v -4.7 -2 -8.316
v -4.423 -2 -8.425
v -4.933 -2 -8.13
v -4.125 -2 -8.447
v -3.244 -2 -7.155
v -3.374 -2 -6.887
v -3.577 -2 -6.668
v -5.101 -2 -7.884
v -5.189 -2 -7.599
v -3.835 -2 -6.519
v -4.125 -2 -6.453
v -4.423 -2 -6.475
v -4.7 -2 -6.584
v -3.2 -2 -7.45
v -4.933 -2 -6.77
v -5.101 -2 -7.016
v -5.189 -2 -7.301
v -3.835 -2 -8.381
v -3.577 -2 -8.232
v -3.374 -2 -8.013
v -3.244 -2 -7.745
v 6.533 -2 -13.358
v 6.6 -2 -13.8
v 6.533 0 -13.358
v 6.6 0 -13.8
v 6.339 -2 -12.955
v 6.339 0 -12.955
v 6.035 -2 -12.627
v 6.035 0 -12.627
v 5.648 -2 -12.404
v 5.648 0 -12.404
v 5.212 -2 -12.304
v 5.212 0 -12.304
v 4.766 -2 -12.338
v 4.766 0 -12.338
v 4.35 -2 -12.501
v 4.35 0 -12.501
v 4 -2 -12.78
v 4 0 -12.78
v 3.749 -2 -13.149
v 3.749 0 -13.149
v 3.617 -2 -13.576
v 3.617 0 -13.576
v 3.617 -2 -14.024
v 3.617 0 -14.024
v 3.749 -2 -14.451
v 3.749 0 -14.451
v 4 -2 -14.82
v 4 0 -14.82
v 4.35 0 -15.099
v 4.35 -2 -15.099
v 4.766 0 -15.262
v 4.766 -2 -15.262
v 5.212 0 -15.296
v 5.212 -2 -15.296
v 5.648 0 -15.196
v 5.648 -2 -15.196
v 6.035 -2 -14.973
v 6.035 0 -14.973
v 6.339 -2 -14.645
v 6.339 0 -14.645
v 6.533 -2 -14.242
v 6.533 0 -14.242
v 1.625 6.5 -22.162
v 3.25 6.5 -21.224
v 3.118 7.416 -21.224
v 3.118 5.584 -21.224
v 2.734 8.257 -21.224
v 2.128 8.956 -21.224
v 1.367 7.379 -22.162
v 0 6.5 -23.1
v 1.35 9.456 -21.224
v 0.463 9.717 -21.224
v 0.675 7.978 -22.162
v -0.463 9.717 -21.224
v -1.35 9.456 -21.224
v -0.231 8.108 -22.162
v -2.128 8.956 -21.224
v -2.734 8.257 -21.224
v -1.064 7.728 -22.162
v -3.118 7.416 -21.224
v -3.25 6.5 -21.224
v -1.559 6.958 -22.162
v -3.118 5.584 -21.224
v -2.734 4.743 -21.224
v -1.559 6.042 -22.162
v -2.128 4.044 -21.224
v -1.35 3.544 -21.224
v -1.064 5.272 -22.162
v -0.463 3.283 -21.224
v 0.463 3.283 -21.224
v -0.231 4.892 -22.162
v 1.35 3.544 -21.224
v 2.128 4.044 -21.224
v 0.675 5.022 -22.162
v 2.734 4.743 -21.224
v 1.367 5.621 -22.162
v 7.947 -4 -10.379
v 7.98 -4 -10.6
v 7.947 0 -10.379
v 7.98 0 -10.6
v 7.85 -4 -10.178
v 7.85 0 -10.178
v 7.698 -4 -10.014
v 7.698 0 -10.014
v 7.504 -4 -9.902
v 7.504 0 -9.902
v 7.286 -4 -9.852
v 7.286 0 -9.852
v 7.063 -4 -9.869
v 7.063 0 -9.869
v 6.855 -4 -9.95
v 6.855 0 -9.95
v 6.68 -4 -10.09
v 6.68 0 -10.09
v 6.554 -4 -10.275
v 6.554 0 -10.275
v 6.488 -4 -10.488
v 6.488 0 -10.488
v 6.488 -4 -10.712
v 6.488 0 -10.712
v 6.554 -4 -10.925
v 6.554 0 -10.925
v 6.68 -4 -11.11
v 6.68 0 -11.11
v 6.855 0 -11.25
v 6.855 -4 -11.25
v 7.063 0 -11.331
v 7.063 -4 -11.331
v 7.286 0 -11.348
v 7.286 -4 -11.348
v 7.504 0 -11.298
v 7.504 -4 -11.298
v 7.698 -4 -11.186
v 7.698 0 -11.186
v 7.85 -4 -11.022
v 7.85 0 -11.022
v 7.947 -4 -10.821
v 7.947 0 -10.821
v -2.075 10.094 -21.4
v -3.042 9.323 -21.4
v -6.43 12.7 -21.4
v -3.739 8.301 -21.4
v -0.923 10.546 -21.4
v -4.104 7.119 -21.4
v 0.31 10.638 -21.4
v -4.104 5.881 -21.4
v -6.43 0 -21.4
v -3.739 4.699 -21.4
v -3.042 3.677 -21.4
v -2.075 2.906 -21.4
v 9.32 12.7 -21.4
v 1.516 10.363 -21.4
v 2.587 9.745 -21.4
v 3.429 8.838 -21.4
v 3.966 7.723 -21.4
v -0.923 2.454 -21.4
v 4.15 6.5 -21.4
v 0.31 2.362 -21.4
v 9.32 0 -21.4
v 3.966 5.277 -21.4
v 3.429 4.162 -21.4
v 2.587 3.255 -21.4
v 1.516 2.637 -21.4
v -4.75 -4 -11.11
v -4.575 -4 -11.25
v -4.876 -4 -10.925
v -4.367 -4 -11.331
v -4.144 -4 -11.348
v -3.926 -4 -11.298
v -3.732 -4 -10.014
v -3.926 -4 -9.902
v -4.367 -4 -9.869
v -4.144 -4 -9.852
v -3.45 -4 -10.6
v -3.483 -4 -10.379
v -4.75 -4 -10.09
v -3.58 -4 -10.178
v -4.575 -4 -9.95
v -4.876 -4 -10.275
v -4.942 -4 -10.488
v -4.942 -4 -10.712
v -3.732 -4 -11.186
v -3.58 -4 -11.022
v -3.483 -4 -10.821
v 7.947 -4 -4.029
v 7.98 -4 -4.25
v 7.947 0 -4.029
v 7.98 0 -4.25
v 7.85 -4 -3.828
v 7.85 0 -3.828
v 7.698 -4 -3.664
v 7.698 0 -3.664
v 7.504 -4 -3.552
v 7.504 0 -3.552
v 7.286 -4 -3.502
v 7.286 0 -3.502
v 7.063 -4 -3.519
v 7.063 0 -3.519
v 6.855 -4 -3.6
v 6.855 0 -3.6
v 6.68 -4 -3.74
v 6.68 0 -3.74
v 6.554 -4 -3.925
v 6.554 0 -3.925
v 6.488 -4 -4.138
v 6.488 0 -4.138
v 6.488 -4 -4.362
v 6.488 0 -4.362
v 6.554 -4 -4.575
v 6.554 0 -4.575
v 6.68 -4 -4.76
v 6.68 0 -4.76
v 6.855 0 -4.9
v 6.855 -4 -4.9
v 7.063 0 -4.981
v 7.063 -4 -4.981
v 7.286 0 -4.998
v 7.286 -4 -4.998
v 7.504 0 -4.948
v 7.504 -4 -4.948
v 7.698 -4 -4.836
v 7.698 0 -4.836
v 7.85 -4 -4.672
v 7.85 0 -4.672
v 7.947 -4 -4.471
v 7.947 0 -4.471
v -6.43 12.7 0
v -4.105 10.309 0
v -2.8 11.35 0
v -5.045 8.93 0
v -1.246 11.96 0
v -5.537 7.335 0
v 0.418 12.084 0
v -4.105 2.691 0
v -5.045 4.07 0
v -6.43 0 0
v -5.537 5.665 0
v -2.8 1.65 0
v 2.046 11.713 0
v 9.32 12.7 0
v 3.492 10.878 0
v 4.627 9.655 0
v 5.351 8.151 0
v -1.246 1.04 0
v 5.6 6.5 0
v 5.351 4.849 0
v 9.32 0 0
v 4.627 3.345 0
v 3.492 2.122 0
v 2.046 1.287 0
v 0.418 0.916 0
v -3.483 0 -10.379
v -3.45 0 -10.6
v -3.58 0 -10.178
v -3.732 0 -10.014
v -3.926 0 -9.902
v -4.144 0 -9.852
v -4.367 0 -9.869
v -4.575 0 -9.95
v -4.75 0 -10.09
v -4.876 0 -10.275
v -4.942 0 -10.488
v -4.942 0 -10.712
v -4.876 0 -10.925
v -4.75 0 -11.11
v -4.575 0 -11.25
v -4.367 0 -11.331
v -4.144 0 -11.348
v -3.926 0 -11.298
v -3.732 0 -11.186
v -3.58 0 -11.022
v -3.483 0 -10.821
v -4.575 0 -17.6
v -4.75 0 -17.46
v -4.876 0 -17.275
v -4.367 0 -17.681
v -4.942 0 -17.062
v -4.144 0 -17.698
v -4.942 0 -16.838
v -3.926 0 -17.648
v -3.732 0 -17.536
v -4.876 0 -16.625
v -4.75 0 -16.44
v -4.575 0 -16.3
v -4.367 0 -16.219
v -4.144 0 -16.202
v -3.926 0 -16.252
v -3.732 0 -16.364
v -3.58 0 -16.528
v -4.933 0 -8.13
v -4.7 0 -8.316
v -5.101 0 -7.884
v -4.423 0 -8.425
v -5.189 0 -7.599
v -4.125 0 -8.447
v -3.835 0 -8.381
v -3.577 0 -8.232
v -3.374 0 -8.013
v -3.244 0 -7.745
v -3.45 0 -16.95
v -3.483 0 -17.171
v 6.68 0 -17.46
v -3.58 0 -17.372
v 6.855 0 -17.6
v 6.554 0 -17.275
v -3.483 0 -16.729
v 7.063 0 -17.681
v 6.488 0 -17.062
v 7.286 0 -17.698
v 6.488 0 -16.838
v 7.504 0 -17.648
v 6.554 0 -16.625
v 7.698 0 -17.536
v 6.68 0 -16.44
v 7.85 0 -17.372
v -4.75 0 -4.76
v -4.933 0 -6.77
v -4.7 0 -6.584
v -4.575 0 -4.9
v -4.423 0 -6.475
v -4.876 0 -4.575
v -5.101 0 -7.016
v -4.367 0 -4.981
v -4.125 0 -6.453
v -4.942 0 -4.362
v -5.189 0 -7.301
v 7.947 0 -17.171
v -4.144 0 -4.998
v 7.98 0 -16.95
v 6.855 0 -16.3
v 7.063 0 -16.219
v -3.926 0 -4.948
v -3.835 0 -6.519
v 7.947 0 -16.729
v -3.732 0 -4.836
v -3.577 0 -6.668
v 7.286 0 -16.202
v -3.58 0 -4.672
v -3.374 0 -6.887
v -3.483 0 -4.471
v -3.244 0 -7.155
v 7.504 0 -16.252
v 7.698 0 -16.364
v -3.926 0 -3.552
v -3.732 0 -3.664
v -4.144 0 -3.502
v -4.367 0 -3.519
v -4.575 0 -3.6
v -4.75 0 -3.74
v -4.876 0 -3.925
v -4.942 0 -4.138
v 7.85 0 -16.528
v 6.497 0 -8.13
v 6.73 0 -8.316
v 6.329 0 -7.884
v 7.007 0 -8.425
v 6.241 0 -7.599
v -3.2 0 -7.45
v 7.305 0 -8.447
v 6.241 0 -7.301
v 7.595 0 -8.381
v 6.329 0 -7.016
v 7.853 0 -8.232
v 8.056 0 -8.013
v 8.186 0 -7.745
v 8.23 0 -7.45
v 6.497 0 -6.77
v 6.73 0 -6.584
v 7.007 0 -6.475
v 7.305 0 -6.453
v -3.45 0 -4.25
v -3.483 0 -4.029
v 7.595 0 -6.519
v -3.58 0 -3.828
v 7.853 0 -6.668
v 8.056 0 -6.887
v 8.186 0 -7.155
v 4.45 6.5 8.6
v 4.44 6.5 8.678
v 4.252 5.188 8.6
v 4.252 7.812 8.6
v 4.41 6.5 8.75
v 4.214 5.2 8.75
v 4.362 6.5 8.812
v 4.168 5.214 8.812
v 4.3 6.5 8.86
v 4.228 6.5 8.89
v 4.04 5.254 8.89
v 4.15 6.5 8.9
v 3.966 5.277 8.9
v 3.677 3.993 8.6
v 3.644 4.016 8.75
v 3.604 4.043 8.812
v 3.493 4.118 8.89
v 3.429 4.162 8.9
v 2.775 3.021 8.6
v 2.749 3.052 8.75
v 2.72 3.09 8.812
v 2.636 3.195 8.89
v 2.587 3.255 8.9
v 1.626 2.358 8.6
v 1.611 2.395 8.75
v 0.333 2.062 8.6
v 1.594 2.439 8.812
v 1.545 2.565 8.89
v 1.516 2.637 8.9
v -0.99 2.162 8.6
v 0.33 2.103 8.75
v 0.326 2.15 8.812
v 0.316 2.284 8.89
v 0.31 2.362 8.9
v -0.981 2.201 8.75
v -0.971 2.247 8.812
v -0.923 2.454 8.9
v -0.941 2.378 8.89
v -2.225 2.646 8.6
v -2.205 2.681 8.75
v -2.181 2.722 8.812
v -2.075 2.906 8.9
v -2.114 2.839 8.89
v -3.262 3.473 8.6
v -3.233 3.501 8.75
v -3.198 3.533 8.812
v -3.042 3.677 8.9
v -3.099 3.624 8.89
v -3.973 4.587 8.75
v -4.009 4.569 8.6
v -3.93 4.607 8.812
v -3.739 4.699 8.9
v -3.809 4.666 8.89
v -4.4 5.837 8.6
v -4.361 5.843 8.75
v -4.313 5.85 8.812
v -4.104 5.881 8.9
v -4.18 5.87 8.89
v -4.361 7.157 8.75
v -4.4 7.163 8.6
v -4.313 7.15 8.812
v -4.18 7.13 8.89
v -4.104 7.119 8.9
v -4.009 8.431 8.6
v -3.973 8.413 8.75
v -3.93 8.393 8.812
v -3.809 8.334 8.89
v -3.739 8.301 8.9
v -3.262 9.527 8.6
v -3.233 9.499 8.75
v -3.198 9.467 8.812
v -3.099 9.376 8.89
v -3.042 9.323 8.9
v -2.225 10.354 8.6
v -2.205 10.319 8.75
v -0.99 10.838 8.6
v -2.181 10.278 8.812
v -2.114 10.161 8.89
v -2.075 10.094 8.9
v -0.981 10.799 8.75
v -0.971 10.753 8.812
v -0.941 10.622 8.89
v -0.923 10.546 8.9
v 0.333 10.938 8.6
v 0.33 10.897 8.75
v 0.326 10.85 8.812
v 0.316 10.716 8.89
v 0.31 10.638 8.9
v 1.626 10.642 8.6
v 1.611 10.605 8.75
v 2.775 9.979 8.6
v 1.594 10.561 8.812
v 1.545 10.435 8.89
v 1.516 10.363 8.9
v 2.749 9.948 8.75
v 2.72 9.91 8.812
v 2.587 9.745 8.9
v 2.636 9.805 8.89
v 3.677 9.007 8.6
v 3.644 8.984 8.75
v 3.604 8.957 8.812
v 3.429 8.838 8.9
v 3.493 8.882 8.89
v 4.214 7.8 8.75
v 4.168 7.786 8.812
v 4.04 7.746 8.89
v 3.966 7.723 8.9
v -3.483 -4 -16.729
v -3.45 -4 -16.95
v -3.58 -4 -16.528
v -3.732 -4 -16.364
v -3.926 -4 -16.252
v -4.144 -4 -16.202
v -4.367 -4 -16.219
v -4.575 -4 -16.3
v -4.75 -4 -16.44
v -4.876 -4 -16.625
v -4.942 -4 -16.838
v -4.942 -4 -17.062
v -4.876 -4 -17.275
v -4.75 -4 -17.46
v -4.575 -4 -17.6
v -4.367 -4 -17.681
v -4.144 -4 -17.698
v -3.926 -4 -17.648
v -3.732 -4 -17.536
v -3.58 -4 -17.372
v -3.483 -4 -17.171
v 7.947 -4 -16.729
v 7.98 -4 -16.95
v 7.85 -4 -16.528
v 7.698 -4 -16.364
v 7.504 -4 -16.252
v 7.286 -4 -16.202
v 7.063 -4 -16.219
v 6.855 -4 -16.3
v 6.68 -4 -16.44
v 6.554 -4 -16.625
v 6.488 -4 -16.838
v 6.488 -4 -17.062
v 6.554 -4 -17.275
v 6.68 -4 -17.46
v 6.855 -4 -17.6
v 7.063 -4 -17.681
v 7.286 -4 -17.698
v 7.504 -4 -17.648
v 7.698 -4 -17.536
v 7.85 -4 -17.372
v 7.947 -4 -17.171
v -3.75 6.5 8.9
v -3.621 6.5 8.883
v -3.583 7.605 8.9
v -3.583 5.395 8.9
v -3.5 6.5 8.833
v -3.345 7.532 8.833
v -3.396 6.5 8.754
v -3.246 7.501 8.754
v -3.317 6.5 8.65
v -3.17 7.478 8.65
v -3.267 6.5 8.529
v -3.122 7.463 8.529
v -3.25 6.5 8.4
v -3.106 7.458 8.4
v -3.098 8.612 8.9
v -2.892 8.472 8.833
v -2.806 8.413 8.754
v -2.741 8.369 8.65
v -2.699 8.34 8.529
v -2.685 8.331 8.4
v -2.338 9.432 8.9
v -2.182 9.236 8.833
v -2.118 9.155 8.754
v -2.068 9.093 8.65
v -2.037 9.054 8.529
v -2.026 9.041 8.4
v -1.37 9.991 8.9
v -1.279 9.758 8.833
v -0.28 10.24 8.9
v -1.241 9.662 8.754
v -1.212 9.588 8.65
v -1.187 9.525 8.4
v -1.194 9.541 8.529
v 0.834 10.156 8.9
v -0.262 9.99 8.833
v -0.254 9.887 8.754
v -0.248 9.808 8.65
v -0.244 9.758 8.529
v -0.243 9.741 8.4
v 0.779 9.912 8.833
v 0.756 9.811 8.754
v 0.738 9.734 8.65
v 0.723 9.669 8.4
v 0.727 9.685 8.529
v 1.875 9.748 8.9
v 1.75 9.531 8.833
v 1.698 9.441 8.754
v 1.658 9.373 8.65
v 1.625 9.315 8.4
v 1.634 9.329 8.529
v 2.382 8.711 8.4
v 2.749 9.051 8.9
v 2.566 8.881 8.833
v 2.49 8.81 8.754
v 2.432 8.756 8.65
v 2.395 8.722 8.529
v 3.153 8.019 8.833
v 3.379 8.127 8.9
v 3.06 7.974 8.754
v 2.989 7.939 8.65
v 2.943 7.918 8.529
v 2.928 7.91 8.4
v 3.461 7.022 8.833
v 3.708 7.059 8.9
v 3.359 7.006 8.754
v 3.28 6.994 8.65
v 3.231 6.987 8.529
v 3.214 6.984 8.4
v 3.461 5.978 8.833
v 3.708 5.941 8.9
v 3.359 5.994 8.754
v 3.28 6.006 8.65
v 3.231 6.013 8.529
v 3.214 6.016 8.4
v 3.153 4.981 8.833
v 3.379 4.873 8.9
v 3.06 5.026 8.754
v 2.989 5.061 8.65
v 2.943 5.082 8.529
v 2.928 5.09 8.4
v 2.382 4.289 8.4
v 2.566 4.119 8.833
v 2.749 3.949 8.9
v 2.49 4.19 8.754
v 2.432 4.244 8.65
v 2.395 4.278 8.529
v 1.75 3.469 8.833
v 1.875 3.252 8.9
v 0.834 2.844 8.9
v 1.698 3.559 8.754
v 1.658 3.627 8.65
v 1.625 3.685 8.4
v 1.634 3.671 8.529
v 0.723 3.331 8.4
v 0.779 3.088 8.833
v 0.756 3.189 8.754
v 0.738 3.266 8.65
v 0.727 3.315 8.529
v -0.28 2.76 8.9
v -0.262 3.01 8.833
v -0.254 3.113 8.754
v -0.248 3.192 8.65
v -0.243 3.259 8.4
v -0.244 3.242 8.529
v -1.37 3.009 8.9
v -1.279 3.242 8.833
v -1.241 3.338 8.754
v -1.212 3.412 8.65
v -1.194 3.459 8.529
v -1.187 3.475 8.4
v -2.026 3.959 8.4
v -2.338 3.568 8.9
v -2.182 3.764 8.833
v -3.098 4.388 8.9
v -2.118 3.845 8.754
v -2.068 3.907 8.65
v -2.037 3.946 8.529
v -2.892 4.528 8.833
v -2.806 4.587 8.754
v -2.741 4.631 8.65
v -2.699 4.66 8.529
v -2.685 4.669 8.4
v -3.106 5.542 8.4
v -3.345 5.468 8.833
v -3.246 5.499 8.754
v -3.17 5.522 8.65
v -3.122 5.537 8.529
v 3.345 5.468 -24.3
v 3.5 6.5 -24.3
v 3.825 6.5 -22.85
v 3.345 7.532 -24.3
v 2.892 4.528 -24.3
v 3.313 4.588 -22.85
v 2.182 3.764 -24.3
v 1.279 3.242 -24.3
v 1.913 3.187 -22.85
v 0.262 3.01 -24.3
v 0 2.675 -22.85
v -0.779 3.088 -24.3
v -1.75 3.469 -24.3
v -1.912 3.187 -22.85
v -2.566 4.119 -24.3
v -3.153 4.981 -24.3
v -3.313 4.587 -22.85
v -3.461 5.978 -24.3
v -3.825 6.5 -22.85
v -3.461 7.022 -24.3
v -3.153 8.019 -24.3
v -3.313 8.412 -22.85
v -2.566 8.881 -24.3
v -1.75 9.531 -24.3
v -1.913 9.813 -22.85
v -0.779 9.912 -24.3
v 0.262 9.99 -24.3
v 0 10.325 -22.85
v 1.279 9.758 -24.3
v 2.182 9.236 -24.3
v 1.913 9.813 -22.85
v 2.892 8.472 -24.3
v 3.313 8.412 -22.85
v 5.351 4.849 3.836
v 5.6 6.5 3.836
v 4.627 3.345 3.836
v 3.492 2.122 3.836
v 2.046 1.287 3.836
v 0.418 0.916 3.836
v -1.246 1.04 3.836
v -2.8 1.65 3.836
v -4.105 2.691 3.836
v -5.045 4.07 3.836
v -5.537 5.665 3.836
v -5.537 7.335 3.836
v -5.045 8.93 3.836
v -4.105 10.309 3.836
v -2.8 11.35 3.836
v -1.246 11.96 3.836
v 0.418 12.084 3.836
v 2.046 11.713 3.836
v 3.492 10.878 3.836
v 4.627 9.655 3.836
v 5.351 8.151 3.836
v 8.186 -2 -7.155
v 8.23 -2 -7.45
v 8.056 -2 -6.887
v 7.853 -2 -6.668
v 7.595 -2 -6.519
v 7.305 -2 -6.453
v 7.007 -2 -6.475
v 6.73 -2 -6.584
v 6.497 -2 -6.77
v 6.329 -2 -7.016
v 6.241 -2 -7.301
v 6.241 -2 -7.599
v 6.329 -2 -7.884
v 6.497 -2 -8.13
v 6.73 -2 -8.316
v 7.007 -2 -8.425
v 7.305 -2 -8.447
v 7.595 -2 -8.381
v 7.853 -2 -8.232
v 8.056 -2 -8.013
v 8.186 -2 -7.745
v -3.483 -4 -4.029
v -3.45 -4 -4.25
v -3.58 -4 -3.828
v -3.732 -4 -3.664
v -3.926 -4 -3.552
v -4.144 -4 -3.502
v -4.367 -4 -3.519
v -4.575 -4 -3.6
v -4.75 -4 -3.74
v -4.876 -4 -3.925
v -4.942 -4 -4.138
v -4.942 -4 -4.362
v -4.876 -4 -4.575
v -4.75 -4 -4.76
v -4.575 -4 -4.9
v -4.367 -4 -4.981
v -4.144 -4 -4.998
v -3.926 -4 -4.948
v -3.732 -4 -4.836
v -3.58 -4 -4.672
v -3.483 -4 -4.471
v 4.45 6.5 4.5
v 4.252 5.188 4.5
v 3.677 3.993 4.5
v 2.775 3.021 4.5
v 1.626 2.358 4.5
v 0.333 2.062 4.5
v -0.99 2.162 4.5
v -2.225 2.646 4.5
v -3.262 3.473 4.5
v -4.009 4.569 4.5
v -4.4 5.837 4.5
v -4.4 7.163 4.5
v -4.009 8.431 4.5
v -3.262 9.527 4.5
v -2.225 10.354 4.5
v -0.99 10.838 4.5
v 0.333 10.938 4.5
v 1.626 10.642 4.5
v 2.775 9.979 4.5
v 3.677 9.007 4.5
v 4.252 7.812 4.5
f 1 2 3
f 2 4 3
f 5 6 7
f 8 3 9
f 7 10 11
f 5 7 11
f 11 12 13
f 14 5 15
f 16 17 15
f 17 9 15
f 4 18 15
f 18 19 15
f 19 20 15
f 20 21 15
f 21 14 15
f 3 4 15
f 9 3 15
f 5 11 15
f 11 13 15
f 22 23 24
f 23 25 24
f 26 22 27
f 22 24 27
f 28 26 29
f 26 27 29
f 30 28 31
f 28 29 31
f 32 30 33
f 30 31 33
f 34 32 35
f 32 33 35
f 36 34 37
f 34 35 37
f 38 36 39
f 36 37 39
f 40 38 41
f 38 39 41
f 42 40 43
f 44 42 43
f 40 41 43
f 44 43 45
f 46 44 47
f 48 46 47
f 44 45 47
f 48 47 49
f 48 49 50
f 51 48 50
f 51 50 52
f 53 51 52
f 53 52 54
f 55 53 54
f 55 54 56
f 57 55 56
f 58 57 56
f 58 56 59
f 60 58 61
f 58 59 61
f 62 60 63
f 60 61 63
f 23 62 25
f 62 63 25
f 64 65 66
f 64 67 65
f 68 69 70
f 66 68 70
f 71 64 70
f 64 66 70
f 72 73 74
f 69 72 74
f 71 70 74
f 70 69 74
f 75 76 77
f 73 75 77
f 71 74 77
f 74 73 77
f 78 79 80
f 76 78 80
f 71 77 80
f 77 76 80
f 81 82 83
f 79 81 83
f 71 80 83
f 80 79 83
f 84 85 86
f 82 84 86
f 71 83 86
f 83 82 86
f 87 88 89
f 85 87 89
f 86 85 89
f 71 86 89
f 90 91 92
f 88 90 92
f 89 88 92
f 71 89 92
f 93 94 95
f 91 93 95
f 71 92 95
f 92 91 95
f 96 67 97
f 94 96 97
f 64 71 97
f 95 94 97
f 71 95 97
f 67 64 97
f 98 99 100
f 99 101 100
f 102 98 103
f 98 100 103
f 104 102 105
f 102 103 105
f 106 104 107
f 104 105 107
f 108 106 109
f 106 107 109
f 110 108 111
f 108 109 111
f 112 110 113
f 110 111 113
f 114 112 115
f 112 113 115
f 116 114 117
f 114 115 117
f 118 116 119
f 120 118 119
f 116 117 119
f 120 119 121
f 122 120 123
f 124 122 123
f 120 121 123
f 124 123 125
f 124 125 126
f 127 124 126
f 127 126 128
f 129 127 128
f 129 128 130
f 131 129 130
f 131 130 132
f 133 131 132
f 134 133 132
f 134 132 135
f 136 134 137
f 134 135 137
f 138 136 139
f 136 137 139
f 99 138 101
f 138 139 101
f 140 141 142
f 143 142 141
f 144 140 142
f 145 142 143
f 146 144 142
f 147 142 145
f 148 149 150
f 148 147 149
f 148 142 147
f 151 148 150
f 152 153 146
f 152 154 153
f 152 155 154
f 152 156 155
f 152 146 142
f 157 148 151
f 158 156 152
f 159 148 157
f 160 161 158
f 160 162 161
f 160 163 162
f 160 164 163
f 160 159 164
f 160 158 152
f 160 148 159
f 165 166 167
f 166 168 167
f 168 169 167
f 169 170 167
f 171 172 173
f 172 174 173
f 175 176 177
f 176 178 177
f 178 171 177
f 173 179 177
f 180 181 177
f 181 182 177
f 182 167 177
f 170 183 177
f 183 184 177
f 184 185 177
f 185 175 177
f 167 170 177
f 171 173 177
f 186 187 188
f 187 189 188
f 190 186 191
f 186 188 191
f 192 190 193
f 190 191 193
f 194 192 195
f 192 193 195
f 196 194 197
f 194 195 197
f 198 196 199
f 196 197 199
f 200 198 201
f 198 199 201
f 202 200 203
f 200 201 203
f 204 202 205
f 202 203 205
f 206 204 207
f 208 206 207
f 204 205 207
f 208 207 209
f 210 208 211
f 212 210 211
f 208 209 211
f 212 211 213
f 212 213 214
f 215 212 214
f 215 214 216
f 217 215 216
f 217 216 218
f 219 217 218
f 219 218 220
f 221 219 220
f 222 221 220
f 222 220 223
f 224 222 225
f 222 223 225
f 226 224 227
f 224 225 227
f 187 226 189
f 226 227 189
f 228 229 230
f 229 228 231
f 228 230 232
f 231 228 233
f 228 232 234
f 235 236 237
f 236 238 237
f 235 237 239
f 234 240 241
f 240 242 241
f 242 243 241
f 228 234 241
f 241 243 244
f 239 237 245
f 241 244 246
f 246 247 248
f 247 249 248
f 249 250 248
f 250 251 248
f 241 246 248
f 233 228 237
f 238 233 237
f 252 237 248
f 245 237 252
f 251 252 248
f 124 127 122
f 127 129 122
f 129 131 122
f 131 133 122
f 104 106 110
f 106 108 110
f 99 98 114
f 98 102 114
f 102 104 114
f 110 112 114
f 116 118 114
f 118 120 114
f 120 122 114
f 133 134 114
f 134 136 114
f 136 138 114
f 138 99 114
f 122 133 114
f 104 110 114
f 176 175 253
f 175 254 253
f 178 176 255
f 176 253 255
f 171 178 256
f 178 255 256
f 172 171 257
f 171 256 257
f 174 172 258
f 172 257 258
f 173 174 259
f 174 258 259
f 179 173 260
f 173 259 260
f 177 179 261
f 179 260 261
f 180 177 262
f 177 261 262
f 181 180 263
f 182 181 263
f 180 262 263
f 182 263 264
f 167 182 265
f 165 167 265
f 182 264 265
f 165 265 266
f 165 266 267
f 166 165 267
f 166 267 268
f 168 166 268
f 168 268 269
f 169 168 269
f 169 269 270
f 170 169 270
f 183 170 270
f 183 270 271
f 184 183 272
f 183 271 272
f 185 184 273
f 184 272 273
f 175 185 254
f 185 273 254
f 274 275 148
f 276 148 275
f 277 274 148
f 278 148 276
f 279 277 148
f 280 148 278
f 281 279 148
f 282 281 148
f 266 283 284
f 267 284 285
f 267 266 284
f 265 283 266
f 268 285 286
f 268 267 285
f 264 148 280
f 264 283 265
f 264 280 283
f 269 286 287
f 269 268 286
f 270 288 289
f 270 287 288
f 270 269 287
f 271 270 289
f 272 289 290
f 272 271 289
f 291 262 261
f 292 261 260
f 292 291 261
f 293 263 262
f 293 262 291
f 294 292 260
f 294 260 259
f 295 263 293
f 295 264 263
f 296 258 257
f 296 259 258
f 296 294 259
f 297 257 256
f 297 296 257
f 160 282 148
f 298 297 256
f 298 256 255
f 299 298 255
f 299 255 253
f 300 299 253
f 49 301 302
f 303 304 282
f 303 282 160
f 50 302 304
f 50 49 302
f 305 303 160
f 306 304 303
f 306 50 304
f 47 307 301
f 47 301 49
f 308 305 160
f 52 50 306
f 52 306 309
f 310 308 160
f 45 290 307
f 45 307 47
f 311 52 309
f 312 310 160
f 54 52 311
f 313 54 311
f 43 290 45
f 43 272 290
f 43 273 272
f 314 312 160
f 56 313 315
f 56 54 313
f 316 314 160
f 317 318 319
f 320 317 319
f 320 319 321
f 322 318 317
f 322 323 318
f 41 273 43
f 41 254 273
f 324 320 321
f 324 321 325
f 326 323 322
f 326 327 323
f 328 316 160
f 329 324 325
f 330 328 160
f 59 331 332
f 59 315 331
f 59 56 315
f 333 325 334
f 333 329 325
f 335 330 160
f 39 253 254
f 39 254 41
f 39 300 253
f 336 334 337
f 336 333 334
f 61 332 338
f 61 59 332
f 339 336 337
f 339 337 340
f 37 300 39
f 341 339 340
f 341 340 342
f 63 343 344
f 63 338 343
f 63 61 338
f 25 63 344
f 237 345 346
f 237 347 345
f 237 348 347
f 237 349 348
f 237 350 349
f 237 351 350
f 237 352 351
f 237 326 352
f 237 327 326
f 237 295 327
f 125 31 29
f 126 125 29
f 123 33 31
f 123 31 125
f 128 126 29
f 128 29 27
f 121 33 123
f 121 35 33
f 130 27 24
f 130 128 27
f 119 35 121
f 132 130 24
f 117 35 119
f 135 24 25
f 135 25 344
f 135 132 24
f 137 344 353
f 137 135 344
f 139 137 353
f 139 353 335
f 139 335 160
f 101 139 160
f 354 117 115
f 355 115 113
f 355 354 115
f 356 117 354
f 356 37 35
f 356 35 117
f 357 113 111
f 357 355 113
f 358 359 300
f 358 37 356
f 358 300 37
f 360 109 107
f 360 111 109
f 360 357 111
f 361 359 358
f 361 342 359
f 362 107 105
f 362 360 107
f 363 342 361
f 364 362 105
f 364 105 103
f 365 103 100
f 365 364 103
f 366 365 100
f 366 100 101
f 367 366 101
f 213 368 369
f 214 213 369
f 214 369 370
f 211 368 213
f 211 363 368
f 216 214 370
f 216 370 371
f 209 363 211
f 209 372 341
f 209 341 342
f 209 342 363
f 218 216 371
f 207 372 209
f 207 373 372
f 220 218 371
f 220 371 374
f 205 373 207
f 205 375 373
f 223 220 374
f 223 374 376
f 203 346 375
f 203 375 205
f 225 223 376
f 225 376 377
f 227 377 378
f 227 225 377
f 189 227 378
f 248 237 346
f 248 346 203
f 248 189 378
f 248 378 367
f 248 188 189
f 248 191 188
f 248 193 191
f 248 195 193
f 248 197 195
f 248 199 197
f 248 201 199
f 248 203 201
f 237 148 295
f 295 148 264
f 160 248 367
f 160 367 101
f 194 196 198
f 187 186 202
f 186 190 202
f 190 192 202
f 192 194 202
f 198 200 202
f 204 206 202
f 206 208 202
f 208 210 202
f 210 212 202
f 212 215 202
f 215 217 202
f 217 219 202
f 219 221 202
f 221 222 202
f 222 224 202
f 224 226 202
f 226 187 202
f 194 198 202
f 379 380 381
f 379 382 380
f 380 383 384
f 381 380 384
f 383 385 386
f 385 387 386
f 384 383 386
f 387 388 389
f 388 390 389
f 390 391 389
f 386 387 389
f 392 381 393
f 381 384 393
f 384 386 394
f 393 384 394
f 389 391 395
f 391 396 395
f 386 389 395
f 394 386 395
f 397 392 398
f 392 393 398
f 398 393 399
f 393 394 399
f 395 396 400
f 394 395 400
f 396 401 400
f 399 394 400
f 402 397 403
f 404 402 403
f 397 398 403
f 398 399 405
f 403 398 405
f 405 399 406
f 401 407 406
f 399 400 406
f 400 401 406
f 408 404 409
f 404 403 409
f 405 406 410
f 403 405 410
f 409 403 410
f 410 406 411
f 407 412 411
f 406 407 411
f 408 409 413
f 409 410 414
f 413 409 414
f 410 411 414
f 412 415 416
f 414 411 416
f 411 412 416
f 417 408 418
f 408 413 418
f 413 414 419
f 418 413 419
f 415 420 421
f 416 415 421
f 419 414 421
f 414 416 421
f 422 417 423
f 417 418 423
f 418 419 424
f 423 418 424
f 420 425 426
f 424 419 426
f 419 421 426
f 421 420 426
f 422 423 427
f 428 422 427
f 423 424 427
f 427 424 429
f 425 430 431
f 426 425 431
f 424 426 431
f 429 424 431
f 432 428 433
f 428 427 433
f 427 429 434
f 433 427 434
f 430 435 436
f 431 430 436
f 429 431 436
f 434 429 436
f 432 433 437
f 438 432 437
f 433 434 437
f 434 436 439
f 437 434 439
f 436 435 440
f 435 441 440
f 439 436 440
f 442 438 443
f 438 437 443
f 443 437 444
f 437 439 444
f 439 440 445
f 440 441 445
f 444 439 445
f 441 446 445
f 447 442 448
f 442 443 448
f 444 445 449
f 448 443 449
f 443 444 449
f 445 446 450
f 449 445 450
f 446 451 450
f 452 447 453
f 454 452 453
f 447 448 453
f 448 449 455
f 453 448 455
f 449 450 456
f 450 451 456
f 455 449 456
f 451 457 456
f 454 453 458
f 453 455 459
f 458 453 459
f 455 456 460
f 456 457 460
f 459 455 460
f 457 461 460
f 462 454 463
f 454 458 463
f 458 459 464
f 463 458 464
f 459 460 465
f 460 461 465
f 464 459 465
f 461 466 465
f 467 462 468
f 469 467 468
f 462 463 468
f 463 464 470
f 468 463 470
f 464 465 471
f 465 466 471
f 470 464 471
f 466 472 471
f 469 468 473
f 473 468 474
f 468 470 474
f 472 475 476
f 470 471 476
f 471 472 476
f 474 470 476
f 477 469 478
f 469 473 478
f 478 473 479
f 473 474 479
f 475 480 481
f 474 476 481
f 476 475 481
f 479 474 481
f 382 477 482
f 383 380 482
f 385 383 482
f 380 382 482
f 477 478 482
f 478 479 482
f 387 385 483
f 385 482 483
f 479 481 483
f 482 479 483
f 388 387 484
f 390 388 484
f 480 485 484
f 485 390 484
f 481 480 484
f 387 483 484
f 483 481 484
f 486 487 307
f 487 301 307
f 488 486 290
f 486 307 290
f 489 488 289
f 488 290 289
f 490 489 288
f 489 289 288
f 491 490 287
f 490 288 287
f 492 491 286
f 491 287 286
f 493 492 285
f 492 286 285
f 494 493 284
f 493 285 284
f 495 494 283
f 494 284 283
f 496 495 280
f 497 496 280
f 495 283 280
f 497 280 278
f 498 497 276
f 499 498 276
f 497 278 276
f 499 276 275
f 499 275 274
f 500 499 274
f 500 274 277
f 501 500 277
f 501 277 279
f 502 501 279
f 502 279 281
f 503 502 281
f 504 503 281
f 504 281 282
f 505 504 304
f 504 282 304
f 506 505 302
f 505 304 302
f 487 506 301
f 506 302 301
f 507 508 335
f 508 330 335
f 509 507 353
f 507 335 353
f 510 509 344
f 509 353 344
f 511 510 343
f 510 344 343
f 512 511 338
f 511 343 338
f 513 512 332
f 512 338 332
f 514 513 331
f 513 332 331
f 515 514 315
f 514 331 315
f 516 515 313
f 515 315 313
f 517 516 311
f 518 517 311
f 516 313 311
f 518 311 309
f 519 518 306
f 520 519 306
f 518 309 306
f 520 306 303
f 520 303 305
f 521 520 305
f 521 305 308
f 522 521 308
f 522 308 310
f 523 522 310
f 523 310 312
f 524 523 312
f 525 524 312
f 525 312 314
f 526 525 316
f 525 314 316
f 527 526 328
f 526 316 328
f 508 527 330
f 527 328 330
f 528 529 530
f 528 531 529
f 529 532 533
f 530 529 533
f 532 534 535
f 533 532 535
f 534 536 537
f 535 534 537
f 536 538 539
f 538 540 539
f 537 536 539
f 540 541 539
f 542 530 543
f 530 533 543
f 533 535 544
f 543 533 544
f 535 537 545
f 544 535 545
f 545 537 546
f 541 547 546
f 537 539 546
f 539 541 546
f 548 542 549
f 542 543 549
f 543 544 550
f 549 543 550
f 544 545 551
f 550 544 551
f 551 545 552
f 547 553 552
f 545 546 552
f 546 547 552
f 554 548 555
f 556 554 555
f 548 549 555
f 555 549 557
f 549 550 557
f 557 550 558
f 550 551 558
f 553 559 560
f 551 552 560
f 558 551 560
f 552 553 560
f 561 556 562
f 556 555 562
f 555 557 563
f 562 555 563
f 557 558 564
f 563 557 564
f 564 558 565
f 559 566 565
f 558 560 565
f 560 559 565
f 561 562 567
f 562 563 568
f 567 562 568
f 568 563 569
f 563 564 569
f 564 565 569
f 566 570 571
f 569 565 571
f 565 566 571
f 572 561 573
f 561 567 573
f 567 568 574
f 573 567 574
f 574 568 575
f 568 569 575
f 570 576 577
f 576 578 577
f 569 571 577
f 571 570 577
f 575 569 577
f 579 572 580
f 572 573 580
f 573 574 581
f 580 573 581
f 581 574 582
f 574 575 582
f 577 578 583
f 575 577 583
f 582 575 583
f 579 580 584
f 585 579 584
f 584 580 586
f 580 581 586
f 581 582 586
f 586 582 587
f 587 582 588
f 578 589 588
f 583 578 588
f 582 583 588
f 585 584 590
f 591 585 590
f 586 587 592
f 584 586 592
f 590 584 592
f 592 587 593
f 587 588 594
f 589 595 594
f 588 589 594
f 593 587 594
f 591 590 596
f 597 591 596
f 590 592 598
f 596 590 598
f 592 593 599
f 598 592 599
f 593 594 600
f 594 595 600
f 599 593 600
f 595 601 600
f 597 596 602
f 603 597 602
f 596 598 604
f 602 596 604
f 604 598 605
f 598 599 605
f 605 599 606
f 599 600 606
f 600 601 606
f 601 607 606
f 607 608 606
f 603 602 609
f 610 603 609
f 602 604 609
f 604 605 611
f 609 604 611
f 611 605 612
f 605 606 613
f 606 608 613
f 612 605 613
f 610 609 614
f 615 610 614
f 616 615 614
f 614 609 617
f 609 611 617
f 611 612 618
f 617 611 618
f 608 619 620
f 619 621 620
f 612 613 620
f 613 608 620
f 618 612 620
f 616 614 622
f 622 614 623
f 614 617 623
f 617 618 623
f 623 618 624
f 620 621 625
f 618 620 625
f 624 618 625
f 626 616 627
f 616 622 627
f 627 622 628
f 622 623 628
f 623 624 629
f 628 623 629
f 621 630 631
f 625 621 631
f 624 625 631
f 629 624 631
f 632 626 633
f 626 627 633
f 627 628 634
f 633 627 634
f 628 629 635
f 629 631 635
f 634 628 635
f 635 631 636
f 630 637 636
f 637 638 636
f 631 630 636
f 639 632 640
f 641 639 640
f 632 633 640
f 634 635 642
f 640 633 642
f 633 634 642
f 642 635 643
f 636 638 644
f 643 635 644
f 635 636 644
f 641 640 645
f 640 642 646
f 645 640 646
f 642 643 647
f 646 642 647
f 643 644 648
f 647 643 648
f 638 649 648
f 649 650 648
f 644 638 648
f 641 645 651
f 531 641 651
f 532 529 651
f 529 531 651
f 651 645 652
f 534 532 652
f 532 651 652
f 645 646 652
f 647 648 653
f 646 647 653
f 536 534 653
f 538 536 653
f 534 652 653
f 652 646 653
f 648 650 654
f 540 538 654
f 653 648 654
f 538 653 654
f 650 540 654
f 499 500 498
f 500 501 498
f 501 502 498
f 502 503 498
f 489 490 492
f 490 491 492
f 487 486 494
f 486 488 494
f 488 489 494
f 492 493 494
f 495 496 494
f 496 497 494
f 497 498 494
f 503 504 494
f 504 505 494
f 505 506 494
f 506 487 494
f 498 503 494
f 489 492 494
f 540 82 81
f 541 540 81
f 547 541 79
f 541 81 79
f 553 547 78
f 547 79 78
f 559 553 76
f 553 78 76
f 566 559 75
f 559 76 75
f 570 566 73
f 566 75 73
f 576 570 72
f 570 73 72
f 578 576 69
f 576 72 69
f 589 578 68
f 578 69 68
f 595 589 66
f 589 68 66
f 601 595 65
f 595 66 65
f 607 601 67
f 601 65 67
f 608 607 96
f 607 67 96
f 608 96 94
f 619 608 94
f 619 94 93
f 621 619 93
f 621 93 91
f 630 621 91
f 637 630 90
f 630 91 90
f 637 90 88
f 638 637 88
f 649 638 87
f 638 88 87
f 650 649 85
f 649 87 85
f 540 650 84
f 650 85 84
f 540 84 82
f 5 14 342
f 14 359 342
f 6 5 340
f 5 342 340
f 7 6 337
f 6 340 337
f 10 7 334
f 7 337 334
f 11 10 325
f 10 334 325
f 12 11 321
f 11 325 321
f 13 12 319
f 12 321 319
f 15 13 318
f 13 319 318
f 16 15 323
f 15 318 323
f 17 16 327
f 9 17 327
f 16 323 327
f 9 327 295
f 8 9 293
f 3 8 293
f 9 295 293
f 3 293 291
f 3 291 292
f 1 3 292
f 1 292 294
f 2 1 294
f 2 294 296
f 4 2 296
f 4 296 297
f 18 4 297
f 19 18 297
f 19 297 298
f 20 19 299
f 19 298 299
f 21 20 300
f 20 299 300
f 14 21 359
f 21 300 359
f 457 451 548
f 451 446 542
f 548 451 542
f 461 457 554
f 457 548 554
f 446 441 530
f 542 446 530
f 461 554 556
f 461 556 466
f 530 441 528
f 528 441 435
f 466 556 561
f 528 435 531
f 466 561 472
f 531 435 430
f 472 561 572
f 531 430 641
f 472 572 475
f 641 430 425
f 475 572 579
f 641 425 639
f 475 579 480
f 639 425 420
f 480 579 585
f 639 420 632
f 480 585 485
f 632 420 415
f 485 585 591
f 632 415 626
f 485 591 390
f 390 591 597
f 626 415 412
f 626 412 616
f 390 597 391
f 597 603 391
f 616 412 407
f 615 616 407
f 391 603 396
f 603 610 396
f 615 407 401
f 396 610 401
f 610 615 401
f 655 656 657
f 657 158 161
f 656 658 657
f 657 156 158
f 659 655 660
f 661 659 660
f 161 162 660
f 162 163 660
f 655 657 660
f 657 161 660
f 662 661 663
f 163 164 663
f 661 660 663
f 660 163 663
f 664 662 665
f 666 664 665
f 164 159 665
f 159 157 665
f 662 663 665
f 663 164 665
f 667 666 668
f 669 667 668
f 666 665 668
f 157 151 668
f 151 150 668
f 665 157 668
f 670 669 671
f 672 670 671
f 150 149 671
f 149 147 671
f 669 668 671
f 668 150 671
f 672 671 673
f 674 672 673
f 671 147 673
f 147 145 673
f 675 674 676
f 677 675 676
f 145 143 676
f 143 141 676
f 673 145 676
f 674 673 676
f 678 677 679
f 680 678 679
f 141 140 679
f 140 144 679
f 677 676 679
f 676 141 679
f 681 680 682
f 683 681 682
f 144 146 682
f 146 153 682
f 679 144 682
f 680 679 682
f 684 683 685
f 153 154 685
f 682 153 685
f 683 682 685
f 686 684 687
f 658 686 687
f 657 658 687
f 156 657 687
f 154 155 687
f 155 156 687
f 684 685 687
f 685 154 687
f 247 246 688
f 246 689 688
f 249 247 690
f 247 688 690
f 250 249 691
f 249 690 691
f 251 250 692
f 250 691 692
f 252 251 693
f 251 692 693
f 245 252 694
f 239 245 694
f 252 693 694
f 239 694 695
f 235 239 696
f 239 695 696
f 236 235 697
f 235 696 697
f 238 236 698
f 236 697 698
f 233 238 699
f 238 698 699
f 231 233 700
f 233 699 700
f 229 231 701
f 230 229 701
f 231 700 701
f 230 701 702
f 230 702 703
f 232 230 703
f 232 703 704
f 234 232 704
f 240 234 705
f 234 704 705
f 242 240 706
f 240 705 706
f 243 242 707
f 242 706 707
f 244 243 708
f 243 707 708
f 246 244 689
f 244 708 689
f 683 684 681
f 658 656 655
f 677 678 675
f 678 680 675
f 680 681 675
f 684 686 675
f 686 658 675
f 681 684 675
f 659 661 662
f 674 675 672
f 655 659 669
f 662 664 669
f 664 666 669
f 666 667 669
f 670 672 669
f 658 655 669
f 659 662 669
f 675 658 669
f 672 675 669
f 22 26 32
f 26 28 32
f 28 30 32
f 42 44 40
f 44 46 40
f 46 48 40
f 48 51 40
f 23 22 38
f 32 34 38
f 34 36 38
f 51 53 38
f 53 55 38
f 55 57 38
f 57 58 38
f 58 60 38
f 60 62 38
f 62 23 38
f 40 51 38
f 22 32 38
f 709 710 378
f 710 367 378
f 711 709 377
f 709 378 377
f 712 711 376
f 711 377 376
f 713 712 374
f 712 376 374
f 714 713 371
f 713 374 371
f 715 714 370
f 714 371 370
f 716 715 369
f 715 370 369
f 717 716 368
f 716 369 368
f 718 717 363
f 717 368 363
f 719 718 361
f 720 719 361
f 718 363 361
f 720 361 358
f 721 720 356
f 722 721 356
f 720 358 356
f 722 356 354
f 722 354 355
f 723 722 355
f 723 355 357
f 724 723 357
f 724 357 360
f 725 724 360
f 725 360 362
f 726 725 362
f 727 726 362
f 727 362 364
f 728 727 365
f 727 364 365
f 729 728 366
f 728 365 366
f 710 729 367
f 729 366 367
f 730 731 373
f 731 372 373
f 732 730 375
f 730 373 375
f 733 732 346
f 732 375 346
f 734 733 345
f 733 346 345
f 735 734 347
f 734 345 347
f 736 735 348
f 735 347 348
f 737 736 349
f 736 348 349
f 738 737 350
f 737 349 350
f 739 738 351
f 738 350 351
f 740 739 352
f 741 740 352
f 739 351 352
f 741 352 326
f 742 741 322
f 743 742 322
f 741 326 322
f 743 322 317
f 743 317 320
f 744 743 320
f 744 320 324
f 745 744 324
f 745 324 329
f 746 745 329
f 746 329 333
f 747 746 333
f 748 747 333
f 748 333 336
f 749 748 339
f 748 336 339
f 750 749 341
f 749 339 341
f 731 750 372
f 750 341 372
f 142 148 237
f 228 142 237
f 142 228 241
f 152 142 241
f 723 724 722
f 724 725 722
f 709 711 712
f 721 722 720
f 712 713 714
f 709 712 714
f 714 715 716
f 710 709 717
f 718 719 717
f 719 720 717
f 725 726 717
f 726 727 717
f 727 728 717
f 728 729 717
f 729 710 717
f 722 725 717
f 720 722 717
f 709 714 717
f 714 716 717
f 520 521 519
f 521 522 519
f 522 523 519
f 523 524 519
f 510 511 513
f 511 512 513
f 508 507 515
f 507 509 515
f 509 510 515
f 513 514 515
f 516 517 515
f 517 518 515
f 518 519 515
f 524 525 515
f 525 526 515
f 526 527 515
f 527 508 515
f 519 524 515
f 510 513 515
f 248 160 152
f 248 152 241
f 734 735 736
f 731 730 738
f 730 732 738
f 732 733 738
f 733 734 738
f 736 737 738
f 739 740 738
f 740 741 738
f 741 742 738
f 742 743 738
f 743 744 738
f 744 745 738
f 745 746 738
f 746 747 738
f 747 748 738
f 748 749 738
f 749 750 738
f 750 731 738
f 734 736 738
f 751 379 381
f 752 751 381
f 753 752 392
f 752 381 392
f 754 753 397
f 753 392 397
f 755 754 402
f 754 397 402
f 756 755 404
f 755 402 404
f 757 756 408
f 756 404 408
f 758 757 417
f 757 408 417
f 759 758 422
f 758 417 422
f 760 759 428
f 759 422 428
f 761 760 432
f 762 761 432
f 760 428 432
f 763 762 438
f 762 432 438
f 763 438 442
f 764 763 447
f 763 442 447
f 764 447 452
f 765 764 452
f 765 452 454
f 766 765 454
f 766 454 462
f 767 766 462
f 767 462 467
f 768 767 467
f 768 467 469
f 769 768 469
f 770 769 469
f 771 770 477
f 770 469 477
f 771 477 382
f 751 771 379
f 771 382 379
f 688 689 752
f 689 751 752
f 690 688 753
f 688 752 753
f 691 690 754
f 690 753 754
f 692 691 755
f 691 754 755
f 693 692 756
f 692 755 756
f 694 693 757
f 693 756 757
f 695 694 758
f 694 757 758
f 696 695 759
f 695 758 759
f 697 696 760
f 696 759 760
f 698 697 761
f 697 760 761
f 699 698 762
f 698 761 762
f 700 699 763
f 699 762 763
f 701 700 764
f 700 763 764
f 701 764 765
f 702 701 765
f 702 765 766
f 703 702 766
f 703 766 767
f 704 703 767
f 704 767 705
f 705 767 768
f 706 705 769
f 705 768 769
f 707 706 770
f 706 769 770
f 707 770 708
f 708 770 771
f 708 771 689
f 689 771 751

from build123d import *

# Parameters (mm, degrees)
SKETCH1_W                      = 15.75
SKETCH1_H                      = 21.4
BOSS_EXTRUDE1_DEPTH            = 12.7
SKETCH3_W                      = 0.75
SKETCH3_H                      = 4
SKETCH4_W                      = 0.75
SKETCH4_H                      = 4
SKETCH5_W                      = 0.75
SKETCH5_H                      = 4
SKETCH6_W                      = 0.75
SKETCH6_H                      = 4
SKETCH7_W                      = 0.75
SKETCH7_H                      = 4
SKETCH8_W                      = 0.75
SKETCH8_H                      = 4
SKETCH9_W                      = 1.5
SKETCH9_H                      = 2
SKETCH10_W                     = 1
SKETCH10_H                     = 2
SKETCH11_W                     = 1
SKETCH11_H                     = 2
F_6_5_6_5_DIAMETER_HOLE1_D     = 6.5
F_6_5_6_5_DIAMETER_HOLE1_DEPTH = 30.123611625
F_6_5_6_5_DIAMETER_HOLE1_TIP   = 1.876388375
FILLET1_R                      = 0.3
FILLET2_R                      = 0.5


with BuildPart() as part:
    # Sketch1 → Boss-Extrude1 (new body)
    with BuildSketch(Plane.XZ):
        with Locations((1.445, -10.7)):
            Rectangle(SKETCH1_W, SKETCH1_H)
    extrude(amount=-BOSS_EXTRUDE1_DEPTH)

    # Sketch2 → Revolve1 (revolve)
    with BuildSketch(Plane.XZ.offset(-6.5)):
        Polygon((4.15, -21.4), (0, -21.4), (0, -24.3), (3.5, -24.3), align=None)
    revolve(axis=Axis((0, 6.5, -21.4), (0, 0, -1)))

    # Sketch3 → Contact Pin #1 (revolve)
    with BuildSketch(Plane.XY.offset(-10.6)):
        with Locations((-3.825, -2)):
            Rectangle(SKETCH3_W, SKETCH3_H)
    revolve(axis=Axis((-4.2, 0, -10.6), (0, -1, 0)))

    # Sketch4 → Contact Pin #2 (revolve)
    with BuildSketch(Plane.XY.offset(-10.6)):
        with Locations((7.605, -2)):
            Rectangle(SKETCH4_W, SKETCH4_H)
    revolve(axis=Axis((7.23, 0, -10.6), (0, -1, 0)))

    # Sketch5 → Contact Pin #3 (revolve)
    with BuildSketch(Plane.XY.offset(-16.95)):
        with Locations((-3.825, -2)):
            Rectangle(SKETCH5_W, SKETCH5_H)
    revolve(axis=Axis((-4.2, 0, -16.95), (0, -1, 0)))

    # Sketch6 → Contact Pin #4 (revolve)
    with BuildSketch(Plane.XY.offset(-4.25)):
        with Locations((-3.825, -2)):
            Rectangle(SKETCH6_W, SKETCH6_H)
    revolve(axis=Axis((-4.2, 0, -4.25), (0, -1, 0)))

    # Sketch7 → Contact Pin #5 (revolve)
    with BuildSketch(Plane.XY.offset(-16.95)):
        with Locations((7.605, -2)):
            Rectangle(SKETCH7_W, SKETCH7_H)
    revolve(axis=Axis((7.23, 0, -16.95), (0, -1, 0)))

    # Sketch8 → Contact Pin #6 (revolve)
    with BuildSketch(Plane.XY.offset(-4.25)):
        with Locations((7.605, -2)):
            Rectangle(SKETCH8_W, SKETCH8_H)
    revolve(axis=Axis((7.23, 0, -4.25), (0, -1, 0)))

    # Sketch9 → Revolve8 (revolve)
    with BuildSketch(Plane.XY.offset(-13.8)):
        with Locations((5.85, -1)):
            Rectangle(SKETCH9_W, SKETCH9_H)
    revolve(axis=Axis((5.1, 0, -13.8), (0, -1, 0)))

    # Sketch10 → Revolve9 (revolve)
    with BuildSketch(Plane.XY.offset(-7.45)):
        with Locations((7.73, -1)):
            Rectangle(SKETCH10_W, SKETCH10_H)
    revolve(axis=Axis((7.23, 0, -7.45), (0, -1, 0)))

    # Sketch11 → Revolve10 (revolve)
    with BuildSketch(Plane.XY.offset(-7.45)):
        with Locations((-3.7, -1)):
            Rectangle(SKETCH11_W, SKETCH11_H)
    revolve(axis=Axis((-4.2, 0, -7.45), (0, -1, 0)))

    # Sketch12 → Revolve11 (revolve)
    with BuildSketch(Plane.XZ.offset(-6.5)):
        Polygon((4.45, 8.9), (0, 8.9), (0, 0), (5.6, 0), (5.6, 3.83604719), (4.45, 4.5), align=None)
    revolve(axis=Axis((0, 6.5, 8.9), (0, 0, -1)))

    # Ø6.5 (6.5) Diameter Hole1
    with Locations(Plane.XY.offset(8.9)):
        with Locations((0, 6.5)):
            Hole(F_6_5_6_5_DIAMETER_HOLE1_D / 2, depth=F_6_5_6_5_DIAMETER_HOLE1_DEPTH)
            with Locations((0, 0, -(F_6_5_6_5_DIAMETER_HOLE1_DEPTH + F_6_5_6_5_DIAMETER_HOLE1_TIP / 2))):  # 120° drill point
                Cone(0, F_6_5_6_5_DIAMETER_HOLE1_D / 2, F_6_5_6_5_DIAMETER_HOLE1_TIP, mode=Mode.SUBTRACT)

    # Fillet1
    fillet1_edges = [part.edges().sort_by_distance(p)[0] for p in [
        (-4.45, 6.5, 8.9),
    ]]
    fillet(fillet1_edges, radius=FILLET1_R)

    # Fillet2
    fillet2_edges = [part.edges().sort_by_distance(p)[0] for p in [
        (3.25, 6.5, 8.9),
    ]]
    fillet(fillet2_edges, radius=FILLET2_R)


solid = part.part
